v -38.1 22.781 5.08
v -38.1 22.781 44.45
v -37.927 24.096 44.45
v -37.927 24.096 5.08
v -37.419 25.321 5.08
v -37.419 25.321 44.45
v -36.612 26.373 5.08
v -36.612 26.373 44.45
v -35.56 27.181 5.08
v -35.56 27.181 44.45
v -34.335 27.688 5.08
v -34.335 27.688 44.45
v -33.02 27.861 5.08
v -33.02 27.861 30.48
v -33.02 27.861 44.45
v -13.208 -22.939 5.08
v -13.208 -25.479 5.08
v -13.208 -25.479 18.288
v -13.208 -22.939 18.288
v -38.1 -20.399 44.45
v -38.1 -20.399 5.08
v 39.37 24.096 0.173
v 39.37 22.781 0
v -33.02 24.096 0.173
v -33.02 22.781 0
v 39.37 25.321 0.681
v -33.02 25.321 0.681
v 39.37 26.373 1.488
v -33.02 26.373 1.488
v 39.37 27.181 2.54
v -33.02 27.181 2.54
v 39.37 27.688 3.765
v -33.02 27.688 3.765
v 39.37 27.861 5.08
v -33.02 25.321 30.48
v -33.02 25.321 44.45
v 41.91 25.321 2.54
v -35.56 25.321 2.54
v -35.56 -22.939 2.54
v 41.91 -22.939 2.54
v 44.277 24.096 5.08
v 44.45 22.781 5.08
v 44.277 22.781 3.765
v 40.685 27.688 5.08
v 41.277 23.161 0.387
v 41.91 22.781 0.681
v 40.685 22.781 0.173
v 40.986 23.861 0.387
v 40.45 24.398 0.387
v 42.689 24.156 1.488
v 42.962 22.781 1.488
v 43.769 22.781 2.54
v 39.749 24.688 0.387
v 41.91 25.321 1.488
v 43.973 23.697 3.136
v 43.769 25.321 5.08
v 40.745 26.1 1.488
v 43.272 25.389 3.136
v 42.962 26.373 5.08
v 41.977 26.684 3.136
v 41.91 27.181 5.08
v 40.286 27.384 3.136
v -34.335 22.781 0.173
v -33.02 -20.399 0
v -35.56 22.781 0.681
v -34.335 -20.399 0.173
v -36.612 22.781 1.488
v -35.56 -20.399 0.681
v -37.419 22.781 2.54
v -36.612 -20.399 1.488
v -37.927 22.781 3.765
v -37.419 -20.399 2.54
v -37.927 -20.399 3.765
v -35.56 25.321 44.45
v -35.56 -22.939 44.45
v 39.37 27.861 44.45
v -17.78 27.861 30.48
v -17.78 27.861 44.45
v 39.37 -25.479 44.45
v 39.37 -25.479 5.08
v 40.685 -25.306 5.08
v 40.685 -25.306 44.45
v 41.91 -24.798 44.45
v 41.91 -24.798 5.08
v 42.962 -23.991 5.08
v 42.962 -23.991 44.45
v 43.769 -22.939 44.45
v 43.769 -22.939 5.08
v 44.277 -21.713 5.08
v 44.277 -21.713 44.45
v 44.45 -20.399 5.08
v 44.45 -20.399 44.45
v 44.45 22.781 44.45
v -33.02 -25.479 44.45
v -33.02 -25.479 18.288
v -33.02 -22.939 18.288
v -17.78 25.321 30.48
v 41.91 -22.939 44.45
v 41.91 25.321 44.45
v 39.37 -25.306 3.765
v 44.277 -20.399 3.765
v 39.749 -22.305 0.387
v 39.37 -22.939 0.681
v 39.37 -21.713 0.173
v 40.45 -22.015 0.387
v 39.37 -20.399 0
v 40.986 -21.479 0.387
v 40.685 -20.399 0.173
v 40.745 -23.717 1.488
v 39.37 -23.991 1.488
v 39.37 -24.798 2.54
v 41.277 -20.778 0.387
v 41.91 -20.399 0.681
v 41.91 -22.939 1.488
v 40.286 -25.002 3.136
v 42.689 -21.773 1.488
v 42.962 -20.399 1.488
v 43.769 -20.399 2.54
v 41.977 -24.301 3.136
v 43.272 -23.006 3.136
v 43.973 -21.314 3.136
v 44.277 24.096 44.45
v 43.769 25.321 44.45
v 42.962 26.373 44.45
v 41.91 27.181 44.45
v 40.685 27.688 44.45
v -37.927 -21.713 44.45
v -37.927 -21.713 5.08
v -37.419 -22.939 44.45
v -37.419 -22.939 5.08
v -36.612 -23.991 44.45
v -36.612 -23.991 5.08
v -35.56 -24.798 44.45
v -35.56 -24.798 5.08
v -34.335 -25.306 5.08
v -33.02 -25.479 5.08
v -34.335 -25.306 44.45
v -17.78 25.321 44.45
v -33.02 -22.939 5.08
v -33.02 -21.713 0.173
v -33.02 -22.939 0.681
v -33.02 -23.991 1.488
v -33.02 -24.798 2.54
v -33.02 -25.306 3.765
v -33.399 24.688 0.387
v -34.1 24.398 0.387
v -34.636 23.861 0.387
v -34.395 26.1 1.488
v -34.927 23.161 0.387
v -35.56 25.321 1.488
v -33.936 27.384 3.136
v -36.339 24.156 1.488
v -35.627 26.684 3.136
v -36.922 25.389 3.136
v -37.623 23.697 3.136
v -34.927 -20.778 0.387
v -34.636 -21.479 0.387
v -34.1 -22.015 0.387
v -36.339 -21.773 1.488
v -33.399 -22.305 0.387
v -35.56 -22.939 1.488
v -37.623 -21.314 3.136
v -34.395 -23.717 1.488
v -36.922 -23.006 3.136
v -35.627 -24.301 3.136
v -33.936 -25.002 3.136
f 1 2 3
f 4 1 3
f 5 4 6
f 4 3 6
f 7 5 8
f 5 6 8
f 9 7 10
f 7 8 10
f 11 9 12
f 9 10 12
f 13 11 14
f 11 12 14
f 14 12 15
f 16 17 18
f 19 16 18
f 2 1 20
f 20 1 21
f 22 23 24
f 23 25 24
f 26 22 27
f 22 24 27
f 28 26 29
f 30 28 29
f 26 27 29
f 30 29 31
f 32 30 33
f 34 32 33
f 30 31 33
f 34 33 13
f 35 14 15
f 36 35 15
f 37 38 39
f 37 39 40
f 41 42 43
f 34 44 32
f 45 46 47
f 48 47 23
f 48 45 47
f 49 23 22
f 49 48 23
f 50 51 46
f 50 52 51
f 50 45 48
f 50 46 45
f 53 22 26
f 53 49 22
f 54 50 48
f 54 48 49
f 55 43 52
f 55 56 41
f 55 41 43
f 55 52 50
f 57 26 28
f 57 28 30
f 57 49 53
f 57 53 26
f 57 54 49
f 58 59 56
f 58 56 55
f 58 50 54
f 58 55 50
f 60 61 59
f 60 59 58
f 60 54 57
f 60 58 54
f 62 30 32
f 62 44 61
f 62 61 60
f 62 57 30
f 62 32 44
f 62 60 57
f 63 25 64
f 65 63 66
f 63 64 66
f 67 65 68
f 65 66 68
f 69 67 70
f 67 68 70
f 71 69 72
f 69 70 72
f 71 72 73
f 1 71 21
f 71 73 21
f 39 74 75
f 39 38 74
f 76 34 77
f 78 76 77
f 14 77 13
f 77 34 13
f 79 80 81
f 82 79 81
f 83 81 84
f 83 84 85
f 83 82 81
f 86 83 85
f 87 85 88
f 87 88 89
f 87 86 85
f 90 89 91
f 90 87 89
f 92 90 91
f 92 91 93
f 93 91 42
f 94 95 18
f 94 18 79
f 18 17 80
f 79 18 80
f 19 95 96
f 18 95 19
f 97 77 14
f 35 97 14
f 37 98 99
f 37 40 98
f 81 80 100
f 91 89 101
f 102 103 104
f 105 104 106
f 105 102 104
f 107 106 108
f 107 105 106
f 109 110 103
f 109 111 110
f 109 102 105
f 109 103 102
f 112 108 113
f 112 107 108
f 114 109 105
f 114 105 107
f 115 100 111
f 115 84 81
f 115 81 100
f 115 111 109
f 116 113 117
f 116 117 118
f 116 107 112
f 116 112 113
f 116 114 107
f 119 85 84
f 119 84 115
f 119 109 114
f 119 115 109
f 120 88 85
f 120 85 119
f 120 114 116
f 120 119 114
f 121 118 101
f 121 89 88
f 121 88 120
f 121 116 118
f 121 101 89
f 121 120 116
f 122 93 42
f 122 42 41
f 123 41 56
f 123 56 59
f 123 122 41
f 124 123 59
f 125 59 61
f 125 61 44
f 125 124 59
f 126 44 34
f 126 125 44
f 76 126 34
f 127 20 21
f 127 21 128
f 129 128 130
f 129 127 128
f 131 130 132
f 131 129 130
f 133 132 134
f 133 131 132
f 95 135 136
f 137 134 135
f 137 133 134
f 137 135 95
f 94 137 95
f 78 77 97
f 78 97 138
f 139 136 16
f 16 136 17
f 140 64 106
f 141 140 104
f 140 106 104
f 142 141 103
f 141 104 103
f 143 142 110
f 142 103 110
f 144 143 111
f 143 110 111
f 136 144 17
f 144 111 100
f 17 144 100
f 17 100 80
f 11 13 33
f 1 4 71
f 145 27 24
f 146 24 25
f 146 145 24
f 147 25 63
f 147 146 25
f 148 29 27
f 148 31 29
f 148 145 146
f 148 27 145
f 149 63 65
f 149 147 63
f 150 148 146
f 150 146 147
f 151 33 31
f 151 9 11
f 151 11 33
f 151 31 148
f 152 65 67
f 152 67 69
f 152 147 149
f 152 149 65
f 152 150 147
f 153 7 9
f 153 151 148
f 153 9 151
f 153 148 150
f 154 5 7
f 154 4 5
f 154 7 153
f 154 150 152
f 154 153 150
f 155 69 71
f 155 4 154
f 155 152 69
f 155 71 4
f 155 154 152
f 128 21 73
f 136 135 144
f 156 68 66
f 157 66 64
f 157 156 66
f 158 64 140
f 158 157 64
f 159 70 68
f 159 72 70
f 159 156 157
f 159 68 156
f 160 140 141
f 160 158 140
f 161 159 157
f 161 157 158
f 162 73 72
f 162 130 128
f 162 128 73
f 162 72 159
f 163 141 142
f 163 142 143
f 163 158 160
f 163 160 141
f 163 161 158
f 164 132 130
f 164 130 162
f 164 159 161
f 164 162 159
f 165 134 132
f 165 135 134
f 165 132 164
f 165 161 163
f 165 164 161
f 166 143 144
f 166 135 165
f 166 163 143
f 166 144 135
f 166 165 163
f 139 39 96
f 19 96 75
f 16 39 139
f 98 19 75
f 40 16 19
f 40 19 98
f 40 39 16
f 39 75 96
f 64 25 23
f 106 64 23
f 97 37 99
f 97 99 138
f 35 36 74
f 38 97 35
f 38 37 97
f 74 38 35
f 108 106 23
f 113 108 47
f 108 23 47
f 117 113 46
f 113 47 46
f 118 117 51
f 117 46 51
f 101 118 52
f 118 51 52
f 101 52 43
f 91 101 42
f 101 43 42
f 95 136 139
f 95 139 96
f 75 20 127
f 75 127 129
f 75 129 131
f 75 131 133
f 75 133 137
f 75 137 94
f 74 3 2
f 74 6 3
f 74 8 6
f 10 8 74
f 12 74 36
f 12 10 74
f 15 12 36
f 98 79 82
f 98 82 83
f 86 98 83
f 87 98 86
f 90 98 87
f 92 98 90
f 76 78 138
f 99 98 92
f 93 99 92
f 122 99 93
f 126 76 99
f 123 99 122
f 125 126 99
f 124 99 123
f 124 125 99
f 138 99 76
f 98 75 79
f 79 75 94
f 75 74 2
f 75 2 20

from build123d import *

# Parameters (mm, degrees)
F1_DEPTH = 44.45
F2_T     = -2.54
F3_R     = 5.08
F4_R     = 5.08
F5_W     = 19.812
F5_H     = 13.208
F6_DEPTH = 5.588
F7_W     = 15.24
F7_H     = 15.325371
F8_DEPTH = 6.604


with BuildPart() as f1:
    # F0 (on Top) → F1 (new body)
    with BuildSketch(Plane.XY):
        Polygon((-38.1, 27.86136), (-38.1, 1.19136), (-38.1, -25.47864), (44.45, -25.47864), (44.45, 1.19136), (44.45, 27.86136), align=None)
    extrude(amount=F1_DEPTH)

    # F2
    f2_openings = [f1.faces().sort_by_distance(p)[0] for p in [
        (3.175, 1.19136, 44.45),
    ]]
    offset(amount=F2_T, openings=f2_openings)

    # F3
    f3_edges = [f1.edges().sort_by_distance(p)[0] for p in [
        (-38.1, 27.86136, 22.225),
        (-38.1, -25.47864, 22.225),
        (44.45, -25.47864, 22.225),
        (44.45, 27.86136, 22.225),
    ]]
    fillet(f3_edges, radius=F3_R)

    # F4
    f4_edges = [f1.edges().sort_by_distance(p)[0] for p in [
        (3.175, 27.86136, 0),
        (42.962102, 26.373463, 0),
        (-36.612102, 26.373463, 0),
        (44.45, 1.19136, 0),
        (-38.1, 1.19136, 0),
        (42.962102, -23.990742, 0),
        (-36.612102, -23.990742, 0),
        (3.175, -25.47864, 0),
    ]]
    fillet(f4_edges, radius=F4_R)

    # F5 (on face) → F6 (cut)
    with BuildSketch(Plane.XZ.offset(25.47864)):
        with Locations((-23.114, 11.684)):
            Rectangle(F5_W, F5_H)
    extrude(amount=-F6_DEPTH, mode=Mode.SUBTRACT)

    # F7 (on face) → F8 (cut)
    with BuildSketch(Plane(origin=(0, 27.86136, 0), x_dir=(-1, 0, 0), z_dir=(0, 1, 0))):
        with Locations((25.4, 38.142685)):
            Rectangle(F7_W, F7_H)
    extrude(amount=-F8_DEPTH, mode=Mode.SUBTRACT)


solid = f1.part
